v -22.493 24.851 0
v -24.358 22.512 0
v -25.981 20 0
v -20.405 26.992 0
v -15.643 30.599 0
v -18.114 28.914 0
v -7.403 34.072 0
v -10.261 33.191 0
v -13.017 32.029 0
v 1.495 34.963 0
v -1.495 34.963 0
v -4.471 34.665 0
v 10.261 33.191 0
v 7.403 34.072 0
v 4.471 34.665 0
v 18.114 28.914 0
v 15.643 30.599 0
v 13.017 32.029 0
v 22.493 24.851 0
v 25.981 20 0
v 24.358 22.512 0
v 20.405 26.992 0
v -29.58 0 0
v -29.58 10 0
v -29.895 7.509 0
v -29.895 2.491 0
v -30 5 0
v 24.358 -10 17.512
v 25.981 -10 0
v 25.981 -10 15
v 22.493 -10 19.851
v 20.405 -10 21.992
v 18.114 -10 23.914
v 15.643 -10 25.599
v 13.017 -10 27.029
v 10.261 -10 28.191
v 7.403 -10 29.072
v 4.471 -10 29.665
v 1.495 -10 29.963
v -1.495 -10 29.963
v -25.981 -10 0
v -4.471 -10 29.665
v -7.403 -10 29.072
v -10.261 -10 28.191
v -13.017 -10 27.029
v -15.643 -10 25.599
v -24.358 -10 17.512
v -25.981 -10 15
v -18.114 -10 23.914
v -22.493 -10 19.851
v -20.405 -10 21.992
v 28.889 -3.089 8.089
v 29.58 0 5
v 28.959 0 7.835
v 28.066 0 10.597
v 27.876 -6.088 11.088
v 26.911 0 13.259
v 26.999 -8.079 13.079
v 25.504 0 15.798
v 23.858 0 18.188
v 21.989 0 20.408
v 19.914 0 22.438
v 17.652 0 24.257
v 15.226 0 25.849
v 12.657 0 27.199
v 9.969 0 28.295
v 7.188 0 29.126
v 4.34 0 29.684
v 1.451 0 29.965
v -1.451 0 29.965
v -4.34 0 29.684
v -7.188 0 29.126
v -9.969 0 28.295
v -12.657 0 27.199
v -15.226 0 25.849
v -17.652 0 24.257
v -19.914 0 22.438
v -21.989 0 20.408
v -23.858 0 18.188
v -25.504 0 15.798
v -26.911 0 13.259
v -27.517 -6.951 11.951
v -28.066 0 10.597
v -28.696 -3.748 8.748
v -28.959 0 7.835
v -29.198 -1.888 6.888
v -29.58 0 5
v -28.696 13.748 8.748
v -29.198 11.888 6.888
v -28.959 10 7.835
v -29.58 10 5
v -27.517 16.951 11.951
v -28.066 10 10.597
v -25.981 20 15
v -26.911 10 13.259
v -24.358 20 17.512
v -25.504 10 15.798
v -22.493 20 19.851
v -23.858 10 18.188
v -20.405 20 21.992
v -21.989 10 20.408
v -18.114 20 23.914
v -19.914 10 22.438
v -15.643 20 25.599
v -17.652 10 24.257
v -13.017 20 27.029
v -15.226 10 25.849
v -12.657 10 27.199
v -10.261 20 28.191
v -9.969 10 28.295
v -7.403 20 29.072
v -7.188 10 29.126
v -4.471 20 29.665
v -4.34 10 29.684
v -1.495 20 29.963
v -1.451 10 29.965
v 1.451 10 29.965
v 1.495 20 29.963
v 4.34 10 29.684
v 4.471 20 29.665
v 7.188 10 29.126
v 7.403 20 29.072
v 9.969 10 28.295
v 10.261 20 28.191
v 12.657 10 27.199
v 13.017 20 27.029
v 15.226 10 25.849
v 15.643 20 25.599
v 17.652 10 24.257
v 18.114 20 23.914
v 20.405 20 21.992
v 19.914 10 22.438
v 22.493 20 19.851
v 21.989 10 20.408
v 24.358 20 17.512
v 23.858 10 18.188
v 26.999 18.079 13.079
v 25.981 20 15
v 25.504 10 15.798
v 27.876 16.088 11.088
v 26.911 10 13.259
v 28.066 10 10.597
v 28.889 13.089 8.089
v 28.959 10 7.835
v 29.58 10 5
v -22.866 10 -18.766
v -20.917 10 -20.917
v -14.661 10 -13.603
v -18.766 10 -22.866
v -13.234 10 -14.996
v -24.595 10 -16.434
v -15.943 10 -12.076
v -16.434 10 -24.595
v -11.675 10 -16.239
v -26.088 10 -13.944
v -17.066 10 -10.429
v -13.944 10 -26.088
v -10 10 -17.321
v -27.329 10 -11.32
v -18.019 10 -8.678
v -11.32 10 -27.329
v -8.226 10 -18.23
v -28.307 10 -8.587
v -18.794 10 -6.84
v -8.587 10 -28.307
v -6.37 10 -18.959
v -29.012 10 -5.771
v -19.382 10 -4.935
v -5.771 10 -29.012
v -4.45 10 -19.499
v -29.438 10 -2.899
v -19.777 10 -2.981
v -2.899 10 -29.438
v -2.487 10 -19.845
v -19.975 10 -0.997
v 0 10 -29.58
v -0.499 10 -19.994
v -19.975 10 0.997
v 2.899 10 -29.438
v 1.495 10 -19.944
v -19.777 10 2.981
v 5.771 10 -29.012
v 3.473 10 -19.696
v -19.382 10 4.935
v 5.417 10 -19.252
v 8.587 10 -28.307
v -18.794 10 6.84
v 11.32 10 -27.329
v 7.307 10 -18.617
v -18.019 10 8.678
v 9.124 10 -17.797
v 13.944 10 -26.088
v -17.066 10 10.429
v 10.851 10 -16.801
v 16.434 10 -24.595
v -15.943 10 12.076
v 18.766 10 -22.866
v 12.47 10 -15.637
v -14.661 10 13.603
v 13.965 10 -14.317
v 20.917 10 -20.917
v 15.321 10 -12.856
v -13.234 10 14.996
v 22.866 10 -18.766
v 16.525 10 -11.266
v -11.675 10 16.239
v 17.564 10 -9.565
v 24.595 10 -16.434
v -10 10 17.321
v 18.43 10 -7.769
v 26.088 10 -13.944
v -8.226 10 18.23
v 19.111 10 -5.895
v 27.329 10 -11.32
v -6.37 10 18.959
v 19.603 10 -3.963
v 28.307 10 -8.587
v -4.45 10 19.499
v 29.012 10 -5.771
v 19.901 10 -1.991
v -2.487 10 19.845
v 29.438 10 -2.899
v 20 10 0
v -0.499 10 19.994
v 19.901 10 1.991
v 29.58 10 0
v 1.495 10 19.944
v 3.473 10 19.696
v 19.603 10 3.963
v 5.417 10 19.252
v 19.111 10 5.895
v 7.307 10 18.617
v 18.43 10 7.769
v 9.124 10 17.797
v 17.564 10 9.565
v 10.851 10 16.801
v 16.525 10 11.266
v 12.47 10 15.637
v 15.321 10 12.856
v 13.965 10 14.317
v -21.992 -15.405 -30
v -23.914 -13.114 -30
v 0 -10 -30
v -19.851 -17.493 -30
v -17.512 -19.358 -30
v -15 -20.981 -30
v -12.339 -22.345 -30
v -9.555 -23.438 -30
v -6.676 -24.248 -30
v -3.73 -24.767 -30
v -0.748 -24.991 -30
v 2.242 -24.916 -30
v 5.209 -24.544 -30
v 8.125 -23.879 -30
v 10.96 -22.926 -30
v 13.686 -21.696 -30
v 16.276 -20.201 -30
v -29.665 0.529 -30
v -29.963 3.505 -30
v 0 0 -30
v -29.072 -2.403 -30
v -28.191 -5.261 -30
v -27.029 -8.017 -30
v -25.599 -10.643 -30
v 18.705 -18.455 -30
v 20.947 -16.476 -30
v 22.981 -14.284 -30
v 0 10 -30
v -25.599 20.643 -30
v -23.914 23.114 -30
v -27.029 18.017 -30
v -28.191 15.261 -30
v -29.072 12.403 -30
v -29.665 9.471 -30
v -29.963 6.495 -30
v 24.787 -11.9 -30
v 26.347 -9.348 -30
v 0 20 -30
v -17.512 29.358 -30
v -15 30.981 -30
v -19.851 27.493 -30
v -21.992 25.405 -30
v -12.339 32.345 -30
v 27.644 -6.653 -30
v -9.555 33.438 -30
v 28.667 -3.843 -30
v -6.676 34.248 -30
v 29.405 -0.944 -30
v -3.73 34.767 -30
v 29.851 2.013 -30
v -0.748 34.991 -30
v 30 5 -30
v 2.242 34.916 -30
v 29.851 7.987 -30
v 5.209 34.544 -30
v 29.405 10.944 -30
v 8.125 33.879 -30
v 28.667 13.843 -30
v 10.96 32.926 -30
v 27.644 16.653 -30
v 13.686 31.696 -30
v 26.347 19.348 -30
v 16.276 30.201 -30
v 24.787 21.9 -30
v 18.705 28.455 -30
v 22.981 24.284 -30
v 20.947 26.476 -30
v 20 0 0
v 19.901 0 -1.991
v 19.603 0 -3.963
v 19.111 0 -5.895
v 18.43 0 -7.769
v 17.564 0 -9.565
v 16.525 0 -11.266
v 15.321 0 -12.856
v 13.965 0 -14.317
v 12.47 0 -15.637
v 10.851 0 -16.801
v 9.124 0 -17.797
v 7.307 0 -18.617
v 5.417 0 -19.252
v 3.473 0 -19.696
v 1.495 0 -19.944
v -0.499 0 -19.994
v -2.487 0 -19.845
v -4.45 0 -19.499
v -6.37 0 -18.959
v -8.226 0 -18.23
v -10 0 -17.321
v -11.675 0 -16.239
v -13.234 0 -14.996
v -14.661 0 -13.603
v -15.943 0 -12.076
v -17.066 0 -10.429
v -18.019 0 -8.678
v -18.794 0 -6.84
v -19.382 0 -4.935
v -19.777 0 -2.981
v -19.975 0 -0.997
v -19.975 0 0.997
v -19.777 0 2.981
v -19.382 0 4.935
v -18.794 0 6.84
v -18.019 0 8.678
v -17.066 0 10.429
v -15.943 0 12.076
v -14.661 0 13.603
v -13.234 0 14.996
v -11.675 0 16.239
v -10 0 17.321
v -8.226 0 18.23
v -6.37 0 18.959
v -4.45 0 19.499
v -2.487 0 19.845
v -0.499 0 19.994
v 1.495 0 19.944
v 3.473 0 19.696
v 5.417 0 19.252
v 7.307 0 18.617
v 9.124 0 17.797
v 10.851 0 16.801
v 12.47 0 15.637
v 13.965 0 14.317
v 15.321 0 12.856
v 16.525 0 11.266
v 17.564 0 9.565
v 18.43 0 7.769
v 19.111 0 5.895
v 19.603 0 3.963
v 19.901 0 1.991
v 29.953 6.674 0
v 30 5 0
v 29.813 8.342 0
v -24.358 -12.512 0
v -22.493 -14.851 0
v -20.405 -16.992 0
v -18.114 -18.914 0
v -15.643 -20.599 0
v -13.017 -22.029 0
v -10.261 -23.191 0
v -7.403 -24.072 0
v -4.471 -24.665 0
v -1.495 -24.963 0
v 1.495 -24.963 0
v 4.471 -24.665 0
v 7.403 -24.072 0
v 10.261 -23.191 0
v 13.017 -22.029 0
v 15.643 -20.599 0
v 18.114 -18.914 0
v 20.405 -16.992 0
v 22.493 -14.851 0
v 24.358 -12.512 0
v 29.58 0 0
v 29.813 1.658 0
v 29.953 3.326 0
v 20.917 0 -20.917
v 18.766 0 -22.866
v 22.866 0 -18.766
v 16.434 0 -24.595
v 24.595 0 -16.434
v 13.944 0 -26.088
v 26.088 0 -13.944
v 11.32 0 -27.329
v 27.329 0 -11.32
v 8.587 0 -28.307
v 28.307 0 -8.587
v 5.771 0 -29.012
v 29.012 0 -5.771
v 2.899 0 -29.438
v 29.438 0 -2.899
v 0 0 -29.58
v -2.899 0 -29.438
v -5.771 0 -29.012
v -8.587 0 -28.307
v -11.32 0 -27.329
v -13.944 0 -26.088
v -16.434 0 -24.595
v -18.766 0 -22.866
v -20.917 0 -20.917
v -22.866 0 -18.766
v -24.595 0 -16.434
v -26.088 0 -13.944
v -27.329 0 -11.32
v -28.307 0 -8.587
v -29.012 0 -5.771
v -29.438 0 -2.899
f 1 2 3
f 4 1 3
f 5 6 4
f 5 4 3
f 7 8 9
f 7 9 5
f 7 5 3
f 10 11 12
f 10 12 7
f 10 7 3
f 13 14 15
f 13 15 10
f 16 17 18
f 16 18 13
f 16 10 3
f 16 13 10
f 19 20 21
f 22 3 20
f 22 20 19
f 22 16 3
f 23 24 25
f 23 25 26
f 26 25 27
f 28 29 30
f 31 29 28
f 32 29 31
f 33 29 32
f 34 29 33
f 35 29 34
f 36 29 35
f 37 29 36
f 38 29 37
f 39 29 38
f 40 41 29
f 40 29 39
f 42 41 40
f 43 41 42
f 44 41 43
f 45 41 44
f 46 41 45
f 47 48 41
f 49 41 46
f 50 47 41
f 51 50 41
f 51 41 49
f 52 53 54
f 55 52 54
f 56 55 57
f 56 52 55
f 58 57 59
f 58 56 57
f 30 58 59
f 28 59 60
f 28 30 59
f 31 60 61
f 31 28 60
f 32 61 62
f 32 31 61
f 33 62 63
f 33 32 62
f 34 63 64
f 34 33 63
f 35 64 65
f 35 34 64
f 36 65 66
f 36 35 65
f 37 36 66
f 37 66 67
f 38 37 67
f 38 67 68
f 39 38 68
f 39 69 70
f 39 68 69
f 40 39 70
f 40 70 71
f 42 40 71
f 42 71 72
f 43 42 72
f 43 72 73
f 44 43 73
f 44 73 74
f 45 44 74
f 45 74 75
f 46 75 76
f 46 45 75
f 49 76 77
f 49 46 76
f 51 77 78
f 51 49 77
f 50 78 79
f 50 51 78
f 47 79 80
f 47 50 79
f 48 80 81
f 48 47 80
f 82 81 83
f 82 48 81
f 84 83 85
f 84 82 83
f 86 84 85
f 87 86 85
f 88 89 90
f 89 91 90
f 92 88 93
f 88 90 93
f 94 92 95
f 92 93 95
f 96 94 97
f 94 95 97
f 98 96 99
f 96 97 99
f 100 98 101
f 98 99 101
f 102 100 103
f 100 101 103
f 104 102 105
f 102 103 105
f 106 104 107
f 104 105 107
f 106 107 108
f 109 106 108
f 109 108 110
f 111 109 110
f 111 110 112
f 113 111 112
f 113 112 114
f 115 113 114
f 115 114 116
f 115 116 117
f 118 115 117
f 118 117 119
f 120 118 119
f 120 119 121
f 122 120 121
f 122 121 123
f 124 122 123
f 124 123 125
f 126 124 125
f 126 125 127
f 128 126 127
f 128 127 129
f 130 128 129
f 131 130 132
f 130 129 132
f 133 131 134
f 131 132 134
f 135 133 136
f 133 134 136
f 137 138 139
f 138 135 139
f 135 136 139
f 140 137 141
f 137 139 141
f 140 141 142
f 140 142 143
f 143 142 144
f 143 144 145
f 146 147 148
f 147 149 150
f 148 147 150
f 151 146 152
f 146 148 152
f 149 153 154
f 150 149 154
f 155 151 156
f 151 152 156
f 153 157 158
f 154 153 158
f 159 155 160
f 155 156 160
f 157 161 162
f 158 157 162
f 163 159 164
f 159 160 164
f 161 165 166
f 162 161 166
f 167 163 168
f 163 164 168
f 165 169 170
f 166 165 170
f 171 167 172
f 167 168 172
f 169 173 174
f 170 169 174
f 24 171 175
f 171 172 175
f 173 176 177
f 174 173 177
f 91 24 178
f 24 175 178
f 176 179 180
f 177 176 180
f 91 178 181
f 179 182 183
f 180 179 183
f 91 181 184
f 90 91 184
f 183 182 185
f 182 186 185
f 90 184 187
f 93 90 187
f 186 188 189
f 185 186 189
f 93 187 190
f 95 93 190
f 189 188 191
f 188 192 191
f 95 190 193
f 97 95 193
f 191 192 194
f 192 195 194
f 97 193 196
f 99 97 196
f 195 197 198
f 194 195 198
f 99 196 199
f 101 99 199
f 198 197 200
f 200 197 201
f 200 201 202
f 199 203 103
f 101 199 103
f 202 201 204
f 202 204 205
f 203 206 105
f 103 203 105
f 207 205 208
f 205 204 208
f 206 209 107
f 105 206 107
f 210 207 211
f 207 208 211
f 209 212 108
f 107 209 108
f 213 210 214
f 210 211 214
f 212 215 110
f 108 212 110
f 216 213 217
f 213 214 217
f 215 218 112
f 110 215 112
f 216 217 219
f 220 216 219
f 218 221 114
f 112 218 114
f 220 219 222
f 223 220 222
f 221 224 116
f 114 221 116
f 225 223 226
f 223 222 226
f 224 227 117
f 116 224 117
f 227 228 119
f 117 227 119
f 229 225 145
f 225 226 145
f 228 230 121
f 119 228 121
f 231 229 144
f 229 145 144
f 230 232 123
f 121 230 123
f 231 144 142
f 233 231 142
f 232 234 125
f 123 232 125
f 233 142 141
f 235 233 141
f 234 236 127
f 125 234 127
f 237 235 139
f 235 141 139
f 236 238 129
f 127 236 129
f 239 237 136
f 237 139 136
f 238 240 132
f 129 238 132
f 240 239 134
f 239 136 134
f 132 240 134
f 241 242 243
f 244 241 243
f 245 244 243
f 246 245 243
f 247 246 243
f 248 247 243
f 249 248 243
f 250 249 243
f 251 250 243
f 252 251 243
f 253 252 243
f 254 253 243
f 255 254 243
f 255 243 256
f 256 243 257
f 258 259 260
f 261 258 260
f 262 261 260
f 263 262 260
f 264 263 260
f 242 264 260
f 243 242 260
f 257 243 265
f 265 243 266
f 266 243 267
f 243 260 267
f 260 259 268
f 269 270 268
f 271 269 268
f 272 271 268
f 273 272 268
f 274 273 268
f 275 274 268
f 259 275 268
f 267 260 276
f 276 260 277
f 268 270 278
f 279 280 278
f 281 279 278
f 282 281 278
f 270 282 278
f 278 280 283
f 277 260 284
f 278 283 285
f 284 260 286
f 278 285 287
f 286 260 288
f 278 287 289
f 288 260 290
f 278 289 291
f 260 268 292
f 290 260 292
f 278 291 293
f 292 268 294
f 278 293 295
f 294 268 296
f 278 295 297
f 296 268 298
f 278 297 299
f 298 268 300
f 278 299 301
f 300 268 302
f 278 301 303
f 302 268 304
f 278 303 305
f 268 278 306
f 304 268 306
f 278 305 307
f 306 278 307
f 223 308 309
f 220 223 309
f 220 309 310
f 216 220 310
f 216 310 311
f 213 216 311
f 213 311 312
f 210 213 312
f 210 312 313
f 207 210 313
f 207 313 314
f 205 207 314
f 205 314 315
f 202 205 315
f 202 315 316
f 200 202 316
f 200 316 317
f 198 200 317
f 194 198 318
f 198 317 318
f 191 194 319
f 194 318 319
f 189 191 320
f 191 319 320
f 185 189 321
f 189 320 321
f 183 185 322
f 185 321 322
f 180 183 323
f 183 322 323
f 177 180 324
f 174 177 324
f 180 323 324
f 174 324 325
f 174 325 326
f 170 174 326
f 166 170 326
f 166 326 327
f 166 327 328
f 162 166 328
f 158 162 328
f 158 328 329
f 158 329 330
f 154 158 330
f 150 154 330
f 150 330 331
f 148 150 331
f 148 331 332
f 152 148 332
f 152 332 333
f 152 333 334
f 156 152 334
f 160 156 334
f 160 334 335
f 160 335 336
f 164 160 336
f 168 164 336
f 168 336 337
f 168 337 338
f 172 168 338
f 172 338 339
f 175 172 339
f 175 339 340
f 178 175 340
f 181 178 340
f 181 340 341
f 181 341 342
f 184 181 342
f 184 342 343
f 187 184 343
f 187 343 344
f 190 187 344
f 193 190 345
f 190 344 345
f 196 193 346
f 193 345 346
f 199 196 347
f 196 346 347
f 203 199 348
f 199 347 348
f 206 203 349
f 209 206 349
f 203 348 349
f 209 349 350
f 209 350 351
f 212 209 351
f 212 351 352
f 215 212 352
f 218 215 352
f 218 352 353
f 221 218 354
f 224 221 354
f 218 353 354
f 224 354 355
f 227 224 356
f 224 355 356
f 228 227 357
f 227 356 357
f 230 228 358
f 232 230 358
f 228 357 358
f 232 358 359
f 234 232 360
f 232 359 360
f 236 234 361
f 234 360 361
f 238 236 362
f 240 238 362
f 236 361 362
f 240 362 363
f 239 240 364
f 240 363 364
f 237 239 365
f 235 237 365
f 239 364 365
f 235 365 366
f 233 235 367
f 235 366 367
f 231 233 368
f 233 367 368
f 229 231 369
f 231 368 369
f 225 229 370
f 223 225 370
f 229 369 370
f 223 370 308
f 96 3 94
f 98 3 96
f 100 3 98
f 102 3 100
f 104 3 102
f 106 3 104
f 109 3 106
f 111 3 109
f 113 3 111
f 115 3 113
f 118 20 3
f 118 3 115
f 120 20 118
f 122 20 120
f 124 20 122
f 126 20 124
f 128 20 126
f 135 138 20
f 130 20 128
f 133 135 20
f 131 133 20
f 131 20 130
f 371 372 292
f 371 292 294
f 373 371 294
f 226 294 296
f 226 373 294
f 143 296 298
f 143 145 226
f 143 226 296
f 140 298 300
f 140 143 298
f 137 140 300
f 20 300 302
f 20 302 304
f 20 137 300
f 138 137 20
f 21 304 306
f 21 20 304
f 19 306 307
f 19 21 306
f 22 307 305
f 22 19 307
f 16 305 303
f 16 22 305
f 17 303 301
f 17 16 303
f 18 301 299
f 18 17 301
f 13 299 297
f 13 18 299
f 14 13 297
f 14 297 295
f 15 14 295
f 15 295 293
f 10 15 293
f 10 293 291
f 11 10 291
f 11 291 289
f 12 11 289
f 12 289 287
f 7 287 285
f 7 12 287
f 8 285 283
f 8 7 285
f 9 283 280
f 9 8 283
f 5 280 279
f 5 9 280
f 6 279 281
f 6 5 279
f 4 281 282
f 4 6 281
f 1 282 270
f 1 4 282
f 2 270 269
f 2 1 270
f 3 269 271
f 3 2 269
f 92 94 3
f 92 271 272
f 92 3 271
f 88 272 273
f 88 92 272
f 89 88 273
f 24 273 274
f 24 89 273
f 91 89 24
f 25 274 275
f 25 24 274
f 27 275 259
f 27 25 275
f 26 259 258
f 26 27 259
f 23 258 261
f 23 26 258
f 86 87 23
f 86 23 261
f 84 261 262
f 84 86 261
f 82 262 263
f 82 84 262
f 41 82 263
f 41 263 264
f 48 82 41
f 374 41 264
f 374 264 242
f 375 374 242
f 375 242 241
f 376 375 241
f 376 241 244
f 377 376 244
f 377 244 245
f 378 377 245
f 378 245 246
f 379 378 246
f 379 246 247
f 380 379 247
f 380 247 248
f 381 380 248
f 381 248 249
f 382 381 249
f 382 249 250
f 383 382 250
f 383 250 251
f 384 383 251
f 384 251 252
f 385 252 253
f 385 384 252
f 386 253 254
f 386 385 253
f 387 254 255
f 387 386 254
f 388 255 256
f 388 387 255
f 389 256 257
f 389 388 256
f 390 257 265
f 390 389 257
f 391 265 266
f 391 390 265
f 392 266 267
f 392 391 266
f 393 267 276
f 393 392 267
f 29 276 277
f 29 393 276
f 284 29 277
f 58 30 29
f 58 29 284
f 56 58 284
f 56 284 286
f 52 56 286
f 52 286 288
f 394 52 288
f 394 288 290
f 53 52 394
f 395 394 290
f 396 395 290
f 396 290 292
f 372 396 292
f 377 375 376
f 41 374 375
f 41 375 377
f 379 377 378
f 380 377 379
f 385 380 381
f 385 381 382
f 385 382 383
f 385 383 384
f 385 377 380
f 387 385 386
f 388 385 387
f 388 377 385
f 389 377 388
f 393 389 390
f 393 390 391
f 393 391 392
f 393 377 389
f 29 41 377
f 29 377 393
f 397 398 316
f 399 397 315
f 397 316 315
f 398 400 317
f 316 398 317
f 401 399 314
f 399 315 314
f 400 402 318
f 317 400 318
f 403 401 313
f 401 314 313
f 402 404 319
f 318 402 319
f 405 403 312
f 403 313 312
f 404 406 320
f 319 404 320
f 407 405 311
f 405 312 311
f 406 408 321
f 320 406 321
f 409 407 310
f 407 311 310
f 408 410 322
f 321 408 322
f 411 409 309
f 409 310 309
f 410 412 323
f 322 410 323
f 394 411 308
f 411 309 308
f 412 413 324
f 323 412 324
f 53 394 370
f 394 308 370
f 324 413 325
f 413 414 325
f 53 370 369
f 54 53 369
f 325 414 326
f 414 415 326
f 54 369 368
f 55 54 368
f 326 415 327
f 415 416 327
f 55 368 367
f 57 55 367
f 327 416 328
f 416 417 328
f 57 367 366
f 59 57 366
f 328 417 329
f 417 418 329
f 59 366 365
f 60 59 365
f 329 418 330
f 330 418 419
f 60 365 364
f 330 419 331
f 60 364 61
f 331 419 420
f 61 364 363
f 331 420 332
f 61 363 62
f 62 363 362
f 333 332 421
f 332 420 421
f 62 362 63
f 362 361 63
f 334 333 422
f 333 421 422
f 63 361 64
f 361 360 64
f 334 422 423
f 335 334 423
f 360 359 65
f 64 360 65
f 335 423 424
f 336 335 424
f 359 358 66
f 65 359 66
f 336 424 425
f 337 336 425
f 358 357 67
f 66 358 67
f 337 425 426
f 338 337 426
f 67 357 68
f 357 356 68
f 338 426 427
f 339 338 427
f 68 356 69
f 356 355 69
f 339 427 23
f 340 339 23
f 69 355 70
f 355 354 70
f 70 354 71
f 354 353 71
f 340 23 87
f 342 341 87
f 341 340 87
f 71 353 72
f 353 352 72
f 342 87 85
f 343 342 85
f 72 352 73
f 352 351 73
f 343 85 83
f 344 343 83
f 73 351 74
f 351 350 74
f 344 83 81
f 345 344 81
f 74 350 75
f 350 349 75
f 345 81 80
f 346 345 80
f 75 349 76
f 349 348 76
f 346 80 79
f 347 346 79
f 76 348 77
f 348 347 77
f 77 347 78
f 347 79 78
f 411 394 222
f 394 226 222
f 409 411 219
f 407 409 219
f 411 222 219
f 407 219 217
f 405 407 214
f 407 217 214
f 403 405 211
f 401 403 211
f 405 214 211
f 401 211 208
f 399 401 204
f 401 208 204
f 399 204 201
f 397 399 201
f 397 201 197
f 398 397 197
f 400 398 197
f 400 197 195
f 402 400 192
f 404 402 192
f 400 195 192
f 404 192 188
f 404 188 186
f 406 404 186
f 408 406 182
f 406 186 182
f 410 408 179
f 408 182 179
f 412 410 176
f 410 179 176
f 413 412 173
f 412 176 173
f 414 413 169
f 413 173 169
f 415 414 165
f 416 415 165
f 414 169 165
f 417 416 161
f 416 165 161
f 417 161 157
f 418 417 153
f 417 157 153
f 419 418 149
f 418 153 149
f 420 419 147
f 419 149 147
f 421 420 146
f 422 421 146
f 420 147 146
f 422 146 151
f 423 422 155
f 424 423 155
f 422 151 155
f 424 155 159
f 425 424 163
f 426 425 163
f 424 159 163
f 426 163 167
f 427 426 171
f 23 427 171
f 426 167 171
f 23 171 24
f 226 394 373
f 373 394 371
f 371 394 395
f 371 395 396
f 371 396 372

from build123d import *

# Parameters (mm, degrees)
SKETCH1_R               = 20
BOSS_EXTRUDE1_DEPTH     = 10
SKETCH2_R               = 30
BOSS_EXTRUDE2_DEPTH     = 10
BOSS_EXTRUDE3_START     = 10
SKETCH3_R               = 30
BOSS_EXTRUDE3_DEPTH     = 10
SKETCH9_R               = 30
BOSS_EXTRUDE7_DEPTH     = 30
CUT_EXTRUDE1_DEPTH      = 56
CUT_EXTRUDE1_DEPTH_BACK = 56
SKETCH13_R              = 36.178766014
SKETCH13_R_2            = 30
SKETCH14_W              = 9.580398915
SKETCH14_H              = 10
CUT_REVOLVE6_ANGLE      = 180


with BuildPart() as part:
    # Sketch1 → Boss-Extrude1 (new body)
    with BuildSketch(Plane(origin=(0, 0, 0), x_dir=(1, 0, 0), z_dir=(0, 1, 0))):
        with Locations(Location((0, 0, 0), (0, 0, 270))):
            Circle(SKETCH1_R)
    extrude(amount=BOSS_EXTRUDE1_DEPTH)

    # Sketch2 → Boss-Extrude2 (add)
    with BuildSketch(Plane(origin=(0, 10, 0), x_dir=(1, 0, 0), z_dir=(0, 1, 0))):
        with Locations(Location((0, 0, 0), (0, 0, 270))):
            Circle(SKETCH2_R)
    extrude(amount=BOSS_EXTRUDE2_DEPTH)

    # Sketch3 → Boss-Extrude3 (add)
    with BuildSketch(Plane.XZ.offset(BOSS_EXTRUDE3_START)):
        with Locations(Location((0, 0, 0), (0, 0, 90))):
            Circle(SKETCH3_R)
    extrude(amount=-BOSS_EXTRUDE3_DEPTH)

    # Sketch9 → Boss-Extrude7 (add)
    with BuildSketch(Plane.XY):
        with Locations((0, 5)):
            Circle(SKETCH9_R)
    extrude(amount=-BOSS_EXTRUDE7_DEPTH)

    # Sketch13 → Cut-Extrude1 (cut, two sides: drawn at the far end of the back side and taken through both)
    with BuildSketch(Plane.XY.offset(-CUT_EXTRUDE1_DEPTH_BACK)):
        with Locations((0, 5)):
            Circle(SKETCH13_R)
        with Locations((0, 5)):
            Circle(SKETCH13_R_2, mode=Mode.SUBTRACT)
    extrude(amount=CUT_EXTRUDE1_DEPTH + CUT_EXTRUDE1_DEPTH_BACK, mode=Mode.SUBTRACT)

    # Sketch14 → Cut-Revolve6 (revolve, cut)
    with BuildSketch(Plane.XY):
        with Locations((24.790199458, 5)):
            Rectangle(SKETCH14_W, SKETCH14_H)
    revolve(axis=Axis((0, 0, 0), (0, 1, 0)), revolution_arc=CUT_REVOLVE6_ANGLE, mode=Mode.SUBTRACT)


solid = part.part
